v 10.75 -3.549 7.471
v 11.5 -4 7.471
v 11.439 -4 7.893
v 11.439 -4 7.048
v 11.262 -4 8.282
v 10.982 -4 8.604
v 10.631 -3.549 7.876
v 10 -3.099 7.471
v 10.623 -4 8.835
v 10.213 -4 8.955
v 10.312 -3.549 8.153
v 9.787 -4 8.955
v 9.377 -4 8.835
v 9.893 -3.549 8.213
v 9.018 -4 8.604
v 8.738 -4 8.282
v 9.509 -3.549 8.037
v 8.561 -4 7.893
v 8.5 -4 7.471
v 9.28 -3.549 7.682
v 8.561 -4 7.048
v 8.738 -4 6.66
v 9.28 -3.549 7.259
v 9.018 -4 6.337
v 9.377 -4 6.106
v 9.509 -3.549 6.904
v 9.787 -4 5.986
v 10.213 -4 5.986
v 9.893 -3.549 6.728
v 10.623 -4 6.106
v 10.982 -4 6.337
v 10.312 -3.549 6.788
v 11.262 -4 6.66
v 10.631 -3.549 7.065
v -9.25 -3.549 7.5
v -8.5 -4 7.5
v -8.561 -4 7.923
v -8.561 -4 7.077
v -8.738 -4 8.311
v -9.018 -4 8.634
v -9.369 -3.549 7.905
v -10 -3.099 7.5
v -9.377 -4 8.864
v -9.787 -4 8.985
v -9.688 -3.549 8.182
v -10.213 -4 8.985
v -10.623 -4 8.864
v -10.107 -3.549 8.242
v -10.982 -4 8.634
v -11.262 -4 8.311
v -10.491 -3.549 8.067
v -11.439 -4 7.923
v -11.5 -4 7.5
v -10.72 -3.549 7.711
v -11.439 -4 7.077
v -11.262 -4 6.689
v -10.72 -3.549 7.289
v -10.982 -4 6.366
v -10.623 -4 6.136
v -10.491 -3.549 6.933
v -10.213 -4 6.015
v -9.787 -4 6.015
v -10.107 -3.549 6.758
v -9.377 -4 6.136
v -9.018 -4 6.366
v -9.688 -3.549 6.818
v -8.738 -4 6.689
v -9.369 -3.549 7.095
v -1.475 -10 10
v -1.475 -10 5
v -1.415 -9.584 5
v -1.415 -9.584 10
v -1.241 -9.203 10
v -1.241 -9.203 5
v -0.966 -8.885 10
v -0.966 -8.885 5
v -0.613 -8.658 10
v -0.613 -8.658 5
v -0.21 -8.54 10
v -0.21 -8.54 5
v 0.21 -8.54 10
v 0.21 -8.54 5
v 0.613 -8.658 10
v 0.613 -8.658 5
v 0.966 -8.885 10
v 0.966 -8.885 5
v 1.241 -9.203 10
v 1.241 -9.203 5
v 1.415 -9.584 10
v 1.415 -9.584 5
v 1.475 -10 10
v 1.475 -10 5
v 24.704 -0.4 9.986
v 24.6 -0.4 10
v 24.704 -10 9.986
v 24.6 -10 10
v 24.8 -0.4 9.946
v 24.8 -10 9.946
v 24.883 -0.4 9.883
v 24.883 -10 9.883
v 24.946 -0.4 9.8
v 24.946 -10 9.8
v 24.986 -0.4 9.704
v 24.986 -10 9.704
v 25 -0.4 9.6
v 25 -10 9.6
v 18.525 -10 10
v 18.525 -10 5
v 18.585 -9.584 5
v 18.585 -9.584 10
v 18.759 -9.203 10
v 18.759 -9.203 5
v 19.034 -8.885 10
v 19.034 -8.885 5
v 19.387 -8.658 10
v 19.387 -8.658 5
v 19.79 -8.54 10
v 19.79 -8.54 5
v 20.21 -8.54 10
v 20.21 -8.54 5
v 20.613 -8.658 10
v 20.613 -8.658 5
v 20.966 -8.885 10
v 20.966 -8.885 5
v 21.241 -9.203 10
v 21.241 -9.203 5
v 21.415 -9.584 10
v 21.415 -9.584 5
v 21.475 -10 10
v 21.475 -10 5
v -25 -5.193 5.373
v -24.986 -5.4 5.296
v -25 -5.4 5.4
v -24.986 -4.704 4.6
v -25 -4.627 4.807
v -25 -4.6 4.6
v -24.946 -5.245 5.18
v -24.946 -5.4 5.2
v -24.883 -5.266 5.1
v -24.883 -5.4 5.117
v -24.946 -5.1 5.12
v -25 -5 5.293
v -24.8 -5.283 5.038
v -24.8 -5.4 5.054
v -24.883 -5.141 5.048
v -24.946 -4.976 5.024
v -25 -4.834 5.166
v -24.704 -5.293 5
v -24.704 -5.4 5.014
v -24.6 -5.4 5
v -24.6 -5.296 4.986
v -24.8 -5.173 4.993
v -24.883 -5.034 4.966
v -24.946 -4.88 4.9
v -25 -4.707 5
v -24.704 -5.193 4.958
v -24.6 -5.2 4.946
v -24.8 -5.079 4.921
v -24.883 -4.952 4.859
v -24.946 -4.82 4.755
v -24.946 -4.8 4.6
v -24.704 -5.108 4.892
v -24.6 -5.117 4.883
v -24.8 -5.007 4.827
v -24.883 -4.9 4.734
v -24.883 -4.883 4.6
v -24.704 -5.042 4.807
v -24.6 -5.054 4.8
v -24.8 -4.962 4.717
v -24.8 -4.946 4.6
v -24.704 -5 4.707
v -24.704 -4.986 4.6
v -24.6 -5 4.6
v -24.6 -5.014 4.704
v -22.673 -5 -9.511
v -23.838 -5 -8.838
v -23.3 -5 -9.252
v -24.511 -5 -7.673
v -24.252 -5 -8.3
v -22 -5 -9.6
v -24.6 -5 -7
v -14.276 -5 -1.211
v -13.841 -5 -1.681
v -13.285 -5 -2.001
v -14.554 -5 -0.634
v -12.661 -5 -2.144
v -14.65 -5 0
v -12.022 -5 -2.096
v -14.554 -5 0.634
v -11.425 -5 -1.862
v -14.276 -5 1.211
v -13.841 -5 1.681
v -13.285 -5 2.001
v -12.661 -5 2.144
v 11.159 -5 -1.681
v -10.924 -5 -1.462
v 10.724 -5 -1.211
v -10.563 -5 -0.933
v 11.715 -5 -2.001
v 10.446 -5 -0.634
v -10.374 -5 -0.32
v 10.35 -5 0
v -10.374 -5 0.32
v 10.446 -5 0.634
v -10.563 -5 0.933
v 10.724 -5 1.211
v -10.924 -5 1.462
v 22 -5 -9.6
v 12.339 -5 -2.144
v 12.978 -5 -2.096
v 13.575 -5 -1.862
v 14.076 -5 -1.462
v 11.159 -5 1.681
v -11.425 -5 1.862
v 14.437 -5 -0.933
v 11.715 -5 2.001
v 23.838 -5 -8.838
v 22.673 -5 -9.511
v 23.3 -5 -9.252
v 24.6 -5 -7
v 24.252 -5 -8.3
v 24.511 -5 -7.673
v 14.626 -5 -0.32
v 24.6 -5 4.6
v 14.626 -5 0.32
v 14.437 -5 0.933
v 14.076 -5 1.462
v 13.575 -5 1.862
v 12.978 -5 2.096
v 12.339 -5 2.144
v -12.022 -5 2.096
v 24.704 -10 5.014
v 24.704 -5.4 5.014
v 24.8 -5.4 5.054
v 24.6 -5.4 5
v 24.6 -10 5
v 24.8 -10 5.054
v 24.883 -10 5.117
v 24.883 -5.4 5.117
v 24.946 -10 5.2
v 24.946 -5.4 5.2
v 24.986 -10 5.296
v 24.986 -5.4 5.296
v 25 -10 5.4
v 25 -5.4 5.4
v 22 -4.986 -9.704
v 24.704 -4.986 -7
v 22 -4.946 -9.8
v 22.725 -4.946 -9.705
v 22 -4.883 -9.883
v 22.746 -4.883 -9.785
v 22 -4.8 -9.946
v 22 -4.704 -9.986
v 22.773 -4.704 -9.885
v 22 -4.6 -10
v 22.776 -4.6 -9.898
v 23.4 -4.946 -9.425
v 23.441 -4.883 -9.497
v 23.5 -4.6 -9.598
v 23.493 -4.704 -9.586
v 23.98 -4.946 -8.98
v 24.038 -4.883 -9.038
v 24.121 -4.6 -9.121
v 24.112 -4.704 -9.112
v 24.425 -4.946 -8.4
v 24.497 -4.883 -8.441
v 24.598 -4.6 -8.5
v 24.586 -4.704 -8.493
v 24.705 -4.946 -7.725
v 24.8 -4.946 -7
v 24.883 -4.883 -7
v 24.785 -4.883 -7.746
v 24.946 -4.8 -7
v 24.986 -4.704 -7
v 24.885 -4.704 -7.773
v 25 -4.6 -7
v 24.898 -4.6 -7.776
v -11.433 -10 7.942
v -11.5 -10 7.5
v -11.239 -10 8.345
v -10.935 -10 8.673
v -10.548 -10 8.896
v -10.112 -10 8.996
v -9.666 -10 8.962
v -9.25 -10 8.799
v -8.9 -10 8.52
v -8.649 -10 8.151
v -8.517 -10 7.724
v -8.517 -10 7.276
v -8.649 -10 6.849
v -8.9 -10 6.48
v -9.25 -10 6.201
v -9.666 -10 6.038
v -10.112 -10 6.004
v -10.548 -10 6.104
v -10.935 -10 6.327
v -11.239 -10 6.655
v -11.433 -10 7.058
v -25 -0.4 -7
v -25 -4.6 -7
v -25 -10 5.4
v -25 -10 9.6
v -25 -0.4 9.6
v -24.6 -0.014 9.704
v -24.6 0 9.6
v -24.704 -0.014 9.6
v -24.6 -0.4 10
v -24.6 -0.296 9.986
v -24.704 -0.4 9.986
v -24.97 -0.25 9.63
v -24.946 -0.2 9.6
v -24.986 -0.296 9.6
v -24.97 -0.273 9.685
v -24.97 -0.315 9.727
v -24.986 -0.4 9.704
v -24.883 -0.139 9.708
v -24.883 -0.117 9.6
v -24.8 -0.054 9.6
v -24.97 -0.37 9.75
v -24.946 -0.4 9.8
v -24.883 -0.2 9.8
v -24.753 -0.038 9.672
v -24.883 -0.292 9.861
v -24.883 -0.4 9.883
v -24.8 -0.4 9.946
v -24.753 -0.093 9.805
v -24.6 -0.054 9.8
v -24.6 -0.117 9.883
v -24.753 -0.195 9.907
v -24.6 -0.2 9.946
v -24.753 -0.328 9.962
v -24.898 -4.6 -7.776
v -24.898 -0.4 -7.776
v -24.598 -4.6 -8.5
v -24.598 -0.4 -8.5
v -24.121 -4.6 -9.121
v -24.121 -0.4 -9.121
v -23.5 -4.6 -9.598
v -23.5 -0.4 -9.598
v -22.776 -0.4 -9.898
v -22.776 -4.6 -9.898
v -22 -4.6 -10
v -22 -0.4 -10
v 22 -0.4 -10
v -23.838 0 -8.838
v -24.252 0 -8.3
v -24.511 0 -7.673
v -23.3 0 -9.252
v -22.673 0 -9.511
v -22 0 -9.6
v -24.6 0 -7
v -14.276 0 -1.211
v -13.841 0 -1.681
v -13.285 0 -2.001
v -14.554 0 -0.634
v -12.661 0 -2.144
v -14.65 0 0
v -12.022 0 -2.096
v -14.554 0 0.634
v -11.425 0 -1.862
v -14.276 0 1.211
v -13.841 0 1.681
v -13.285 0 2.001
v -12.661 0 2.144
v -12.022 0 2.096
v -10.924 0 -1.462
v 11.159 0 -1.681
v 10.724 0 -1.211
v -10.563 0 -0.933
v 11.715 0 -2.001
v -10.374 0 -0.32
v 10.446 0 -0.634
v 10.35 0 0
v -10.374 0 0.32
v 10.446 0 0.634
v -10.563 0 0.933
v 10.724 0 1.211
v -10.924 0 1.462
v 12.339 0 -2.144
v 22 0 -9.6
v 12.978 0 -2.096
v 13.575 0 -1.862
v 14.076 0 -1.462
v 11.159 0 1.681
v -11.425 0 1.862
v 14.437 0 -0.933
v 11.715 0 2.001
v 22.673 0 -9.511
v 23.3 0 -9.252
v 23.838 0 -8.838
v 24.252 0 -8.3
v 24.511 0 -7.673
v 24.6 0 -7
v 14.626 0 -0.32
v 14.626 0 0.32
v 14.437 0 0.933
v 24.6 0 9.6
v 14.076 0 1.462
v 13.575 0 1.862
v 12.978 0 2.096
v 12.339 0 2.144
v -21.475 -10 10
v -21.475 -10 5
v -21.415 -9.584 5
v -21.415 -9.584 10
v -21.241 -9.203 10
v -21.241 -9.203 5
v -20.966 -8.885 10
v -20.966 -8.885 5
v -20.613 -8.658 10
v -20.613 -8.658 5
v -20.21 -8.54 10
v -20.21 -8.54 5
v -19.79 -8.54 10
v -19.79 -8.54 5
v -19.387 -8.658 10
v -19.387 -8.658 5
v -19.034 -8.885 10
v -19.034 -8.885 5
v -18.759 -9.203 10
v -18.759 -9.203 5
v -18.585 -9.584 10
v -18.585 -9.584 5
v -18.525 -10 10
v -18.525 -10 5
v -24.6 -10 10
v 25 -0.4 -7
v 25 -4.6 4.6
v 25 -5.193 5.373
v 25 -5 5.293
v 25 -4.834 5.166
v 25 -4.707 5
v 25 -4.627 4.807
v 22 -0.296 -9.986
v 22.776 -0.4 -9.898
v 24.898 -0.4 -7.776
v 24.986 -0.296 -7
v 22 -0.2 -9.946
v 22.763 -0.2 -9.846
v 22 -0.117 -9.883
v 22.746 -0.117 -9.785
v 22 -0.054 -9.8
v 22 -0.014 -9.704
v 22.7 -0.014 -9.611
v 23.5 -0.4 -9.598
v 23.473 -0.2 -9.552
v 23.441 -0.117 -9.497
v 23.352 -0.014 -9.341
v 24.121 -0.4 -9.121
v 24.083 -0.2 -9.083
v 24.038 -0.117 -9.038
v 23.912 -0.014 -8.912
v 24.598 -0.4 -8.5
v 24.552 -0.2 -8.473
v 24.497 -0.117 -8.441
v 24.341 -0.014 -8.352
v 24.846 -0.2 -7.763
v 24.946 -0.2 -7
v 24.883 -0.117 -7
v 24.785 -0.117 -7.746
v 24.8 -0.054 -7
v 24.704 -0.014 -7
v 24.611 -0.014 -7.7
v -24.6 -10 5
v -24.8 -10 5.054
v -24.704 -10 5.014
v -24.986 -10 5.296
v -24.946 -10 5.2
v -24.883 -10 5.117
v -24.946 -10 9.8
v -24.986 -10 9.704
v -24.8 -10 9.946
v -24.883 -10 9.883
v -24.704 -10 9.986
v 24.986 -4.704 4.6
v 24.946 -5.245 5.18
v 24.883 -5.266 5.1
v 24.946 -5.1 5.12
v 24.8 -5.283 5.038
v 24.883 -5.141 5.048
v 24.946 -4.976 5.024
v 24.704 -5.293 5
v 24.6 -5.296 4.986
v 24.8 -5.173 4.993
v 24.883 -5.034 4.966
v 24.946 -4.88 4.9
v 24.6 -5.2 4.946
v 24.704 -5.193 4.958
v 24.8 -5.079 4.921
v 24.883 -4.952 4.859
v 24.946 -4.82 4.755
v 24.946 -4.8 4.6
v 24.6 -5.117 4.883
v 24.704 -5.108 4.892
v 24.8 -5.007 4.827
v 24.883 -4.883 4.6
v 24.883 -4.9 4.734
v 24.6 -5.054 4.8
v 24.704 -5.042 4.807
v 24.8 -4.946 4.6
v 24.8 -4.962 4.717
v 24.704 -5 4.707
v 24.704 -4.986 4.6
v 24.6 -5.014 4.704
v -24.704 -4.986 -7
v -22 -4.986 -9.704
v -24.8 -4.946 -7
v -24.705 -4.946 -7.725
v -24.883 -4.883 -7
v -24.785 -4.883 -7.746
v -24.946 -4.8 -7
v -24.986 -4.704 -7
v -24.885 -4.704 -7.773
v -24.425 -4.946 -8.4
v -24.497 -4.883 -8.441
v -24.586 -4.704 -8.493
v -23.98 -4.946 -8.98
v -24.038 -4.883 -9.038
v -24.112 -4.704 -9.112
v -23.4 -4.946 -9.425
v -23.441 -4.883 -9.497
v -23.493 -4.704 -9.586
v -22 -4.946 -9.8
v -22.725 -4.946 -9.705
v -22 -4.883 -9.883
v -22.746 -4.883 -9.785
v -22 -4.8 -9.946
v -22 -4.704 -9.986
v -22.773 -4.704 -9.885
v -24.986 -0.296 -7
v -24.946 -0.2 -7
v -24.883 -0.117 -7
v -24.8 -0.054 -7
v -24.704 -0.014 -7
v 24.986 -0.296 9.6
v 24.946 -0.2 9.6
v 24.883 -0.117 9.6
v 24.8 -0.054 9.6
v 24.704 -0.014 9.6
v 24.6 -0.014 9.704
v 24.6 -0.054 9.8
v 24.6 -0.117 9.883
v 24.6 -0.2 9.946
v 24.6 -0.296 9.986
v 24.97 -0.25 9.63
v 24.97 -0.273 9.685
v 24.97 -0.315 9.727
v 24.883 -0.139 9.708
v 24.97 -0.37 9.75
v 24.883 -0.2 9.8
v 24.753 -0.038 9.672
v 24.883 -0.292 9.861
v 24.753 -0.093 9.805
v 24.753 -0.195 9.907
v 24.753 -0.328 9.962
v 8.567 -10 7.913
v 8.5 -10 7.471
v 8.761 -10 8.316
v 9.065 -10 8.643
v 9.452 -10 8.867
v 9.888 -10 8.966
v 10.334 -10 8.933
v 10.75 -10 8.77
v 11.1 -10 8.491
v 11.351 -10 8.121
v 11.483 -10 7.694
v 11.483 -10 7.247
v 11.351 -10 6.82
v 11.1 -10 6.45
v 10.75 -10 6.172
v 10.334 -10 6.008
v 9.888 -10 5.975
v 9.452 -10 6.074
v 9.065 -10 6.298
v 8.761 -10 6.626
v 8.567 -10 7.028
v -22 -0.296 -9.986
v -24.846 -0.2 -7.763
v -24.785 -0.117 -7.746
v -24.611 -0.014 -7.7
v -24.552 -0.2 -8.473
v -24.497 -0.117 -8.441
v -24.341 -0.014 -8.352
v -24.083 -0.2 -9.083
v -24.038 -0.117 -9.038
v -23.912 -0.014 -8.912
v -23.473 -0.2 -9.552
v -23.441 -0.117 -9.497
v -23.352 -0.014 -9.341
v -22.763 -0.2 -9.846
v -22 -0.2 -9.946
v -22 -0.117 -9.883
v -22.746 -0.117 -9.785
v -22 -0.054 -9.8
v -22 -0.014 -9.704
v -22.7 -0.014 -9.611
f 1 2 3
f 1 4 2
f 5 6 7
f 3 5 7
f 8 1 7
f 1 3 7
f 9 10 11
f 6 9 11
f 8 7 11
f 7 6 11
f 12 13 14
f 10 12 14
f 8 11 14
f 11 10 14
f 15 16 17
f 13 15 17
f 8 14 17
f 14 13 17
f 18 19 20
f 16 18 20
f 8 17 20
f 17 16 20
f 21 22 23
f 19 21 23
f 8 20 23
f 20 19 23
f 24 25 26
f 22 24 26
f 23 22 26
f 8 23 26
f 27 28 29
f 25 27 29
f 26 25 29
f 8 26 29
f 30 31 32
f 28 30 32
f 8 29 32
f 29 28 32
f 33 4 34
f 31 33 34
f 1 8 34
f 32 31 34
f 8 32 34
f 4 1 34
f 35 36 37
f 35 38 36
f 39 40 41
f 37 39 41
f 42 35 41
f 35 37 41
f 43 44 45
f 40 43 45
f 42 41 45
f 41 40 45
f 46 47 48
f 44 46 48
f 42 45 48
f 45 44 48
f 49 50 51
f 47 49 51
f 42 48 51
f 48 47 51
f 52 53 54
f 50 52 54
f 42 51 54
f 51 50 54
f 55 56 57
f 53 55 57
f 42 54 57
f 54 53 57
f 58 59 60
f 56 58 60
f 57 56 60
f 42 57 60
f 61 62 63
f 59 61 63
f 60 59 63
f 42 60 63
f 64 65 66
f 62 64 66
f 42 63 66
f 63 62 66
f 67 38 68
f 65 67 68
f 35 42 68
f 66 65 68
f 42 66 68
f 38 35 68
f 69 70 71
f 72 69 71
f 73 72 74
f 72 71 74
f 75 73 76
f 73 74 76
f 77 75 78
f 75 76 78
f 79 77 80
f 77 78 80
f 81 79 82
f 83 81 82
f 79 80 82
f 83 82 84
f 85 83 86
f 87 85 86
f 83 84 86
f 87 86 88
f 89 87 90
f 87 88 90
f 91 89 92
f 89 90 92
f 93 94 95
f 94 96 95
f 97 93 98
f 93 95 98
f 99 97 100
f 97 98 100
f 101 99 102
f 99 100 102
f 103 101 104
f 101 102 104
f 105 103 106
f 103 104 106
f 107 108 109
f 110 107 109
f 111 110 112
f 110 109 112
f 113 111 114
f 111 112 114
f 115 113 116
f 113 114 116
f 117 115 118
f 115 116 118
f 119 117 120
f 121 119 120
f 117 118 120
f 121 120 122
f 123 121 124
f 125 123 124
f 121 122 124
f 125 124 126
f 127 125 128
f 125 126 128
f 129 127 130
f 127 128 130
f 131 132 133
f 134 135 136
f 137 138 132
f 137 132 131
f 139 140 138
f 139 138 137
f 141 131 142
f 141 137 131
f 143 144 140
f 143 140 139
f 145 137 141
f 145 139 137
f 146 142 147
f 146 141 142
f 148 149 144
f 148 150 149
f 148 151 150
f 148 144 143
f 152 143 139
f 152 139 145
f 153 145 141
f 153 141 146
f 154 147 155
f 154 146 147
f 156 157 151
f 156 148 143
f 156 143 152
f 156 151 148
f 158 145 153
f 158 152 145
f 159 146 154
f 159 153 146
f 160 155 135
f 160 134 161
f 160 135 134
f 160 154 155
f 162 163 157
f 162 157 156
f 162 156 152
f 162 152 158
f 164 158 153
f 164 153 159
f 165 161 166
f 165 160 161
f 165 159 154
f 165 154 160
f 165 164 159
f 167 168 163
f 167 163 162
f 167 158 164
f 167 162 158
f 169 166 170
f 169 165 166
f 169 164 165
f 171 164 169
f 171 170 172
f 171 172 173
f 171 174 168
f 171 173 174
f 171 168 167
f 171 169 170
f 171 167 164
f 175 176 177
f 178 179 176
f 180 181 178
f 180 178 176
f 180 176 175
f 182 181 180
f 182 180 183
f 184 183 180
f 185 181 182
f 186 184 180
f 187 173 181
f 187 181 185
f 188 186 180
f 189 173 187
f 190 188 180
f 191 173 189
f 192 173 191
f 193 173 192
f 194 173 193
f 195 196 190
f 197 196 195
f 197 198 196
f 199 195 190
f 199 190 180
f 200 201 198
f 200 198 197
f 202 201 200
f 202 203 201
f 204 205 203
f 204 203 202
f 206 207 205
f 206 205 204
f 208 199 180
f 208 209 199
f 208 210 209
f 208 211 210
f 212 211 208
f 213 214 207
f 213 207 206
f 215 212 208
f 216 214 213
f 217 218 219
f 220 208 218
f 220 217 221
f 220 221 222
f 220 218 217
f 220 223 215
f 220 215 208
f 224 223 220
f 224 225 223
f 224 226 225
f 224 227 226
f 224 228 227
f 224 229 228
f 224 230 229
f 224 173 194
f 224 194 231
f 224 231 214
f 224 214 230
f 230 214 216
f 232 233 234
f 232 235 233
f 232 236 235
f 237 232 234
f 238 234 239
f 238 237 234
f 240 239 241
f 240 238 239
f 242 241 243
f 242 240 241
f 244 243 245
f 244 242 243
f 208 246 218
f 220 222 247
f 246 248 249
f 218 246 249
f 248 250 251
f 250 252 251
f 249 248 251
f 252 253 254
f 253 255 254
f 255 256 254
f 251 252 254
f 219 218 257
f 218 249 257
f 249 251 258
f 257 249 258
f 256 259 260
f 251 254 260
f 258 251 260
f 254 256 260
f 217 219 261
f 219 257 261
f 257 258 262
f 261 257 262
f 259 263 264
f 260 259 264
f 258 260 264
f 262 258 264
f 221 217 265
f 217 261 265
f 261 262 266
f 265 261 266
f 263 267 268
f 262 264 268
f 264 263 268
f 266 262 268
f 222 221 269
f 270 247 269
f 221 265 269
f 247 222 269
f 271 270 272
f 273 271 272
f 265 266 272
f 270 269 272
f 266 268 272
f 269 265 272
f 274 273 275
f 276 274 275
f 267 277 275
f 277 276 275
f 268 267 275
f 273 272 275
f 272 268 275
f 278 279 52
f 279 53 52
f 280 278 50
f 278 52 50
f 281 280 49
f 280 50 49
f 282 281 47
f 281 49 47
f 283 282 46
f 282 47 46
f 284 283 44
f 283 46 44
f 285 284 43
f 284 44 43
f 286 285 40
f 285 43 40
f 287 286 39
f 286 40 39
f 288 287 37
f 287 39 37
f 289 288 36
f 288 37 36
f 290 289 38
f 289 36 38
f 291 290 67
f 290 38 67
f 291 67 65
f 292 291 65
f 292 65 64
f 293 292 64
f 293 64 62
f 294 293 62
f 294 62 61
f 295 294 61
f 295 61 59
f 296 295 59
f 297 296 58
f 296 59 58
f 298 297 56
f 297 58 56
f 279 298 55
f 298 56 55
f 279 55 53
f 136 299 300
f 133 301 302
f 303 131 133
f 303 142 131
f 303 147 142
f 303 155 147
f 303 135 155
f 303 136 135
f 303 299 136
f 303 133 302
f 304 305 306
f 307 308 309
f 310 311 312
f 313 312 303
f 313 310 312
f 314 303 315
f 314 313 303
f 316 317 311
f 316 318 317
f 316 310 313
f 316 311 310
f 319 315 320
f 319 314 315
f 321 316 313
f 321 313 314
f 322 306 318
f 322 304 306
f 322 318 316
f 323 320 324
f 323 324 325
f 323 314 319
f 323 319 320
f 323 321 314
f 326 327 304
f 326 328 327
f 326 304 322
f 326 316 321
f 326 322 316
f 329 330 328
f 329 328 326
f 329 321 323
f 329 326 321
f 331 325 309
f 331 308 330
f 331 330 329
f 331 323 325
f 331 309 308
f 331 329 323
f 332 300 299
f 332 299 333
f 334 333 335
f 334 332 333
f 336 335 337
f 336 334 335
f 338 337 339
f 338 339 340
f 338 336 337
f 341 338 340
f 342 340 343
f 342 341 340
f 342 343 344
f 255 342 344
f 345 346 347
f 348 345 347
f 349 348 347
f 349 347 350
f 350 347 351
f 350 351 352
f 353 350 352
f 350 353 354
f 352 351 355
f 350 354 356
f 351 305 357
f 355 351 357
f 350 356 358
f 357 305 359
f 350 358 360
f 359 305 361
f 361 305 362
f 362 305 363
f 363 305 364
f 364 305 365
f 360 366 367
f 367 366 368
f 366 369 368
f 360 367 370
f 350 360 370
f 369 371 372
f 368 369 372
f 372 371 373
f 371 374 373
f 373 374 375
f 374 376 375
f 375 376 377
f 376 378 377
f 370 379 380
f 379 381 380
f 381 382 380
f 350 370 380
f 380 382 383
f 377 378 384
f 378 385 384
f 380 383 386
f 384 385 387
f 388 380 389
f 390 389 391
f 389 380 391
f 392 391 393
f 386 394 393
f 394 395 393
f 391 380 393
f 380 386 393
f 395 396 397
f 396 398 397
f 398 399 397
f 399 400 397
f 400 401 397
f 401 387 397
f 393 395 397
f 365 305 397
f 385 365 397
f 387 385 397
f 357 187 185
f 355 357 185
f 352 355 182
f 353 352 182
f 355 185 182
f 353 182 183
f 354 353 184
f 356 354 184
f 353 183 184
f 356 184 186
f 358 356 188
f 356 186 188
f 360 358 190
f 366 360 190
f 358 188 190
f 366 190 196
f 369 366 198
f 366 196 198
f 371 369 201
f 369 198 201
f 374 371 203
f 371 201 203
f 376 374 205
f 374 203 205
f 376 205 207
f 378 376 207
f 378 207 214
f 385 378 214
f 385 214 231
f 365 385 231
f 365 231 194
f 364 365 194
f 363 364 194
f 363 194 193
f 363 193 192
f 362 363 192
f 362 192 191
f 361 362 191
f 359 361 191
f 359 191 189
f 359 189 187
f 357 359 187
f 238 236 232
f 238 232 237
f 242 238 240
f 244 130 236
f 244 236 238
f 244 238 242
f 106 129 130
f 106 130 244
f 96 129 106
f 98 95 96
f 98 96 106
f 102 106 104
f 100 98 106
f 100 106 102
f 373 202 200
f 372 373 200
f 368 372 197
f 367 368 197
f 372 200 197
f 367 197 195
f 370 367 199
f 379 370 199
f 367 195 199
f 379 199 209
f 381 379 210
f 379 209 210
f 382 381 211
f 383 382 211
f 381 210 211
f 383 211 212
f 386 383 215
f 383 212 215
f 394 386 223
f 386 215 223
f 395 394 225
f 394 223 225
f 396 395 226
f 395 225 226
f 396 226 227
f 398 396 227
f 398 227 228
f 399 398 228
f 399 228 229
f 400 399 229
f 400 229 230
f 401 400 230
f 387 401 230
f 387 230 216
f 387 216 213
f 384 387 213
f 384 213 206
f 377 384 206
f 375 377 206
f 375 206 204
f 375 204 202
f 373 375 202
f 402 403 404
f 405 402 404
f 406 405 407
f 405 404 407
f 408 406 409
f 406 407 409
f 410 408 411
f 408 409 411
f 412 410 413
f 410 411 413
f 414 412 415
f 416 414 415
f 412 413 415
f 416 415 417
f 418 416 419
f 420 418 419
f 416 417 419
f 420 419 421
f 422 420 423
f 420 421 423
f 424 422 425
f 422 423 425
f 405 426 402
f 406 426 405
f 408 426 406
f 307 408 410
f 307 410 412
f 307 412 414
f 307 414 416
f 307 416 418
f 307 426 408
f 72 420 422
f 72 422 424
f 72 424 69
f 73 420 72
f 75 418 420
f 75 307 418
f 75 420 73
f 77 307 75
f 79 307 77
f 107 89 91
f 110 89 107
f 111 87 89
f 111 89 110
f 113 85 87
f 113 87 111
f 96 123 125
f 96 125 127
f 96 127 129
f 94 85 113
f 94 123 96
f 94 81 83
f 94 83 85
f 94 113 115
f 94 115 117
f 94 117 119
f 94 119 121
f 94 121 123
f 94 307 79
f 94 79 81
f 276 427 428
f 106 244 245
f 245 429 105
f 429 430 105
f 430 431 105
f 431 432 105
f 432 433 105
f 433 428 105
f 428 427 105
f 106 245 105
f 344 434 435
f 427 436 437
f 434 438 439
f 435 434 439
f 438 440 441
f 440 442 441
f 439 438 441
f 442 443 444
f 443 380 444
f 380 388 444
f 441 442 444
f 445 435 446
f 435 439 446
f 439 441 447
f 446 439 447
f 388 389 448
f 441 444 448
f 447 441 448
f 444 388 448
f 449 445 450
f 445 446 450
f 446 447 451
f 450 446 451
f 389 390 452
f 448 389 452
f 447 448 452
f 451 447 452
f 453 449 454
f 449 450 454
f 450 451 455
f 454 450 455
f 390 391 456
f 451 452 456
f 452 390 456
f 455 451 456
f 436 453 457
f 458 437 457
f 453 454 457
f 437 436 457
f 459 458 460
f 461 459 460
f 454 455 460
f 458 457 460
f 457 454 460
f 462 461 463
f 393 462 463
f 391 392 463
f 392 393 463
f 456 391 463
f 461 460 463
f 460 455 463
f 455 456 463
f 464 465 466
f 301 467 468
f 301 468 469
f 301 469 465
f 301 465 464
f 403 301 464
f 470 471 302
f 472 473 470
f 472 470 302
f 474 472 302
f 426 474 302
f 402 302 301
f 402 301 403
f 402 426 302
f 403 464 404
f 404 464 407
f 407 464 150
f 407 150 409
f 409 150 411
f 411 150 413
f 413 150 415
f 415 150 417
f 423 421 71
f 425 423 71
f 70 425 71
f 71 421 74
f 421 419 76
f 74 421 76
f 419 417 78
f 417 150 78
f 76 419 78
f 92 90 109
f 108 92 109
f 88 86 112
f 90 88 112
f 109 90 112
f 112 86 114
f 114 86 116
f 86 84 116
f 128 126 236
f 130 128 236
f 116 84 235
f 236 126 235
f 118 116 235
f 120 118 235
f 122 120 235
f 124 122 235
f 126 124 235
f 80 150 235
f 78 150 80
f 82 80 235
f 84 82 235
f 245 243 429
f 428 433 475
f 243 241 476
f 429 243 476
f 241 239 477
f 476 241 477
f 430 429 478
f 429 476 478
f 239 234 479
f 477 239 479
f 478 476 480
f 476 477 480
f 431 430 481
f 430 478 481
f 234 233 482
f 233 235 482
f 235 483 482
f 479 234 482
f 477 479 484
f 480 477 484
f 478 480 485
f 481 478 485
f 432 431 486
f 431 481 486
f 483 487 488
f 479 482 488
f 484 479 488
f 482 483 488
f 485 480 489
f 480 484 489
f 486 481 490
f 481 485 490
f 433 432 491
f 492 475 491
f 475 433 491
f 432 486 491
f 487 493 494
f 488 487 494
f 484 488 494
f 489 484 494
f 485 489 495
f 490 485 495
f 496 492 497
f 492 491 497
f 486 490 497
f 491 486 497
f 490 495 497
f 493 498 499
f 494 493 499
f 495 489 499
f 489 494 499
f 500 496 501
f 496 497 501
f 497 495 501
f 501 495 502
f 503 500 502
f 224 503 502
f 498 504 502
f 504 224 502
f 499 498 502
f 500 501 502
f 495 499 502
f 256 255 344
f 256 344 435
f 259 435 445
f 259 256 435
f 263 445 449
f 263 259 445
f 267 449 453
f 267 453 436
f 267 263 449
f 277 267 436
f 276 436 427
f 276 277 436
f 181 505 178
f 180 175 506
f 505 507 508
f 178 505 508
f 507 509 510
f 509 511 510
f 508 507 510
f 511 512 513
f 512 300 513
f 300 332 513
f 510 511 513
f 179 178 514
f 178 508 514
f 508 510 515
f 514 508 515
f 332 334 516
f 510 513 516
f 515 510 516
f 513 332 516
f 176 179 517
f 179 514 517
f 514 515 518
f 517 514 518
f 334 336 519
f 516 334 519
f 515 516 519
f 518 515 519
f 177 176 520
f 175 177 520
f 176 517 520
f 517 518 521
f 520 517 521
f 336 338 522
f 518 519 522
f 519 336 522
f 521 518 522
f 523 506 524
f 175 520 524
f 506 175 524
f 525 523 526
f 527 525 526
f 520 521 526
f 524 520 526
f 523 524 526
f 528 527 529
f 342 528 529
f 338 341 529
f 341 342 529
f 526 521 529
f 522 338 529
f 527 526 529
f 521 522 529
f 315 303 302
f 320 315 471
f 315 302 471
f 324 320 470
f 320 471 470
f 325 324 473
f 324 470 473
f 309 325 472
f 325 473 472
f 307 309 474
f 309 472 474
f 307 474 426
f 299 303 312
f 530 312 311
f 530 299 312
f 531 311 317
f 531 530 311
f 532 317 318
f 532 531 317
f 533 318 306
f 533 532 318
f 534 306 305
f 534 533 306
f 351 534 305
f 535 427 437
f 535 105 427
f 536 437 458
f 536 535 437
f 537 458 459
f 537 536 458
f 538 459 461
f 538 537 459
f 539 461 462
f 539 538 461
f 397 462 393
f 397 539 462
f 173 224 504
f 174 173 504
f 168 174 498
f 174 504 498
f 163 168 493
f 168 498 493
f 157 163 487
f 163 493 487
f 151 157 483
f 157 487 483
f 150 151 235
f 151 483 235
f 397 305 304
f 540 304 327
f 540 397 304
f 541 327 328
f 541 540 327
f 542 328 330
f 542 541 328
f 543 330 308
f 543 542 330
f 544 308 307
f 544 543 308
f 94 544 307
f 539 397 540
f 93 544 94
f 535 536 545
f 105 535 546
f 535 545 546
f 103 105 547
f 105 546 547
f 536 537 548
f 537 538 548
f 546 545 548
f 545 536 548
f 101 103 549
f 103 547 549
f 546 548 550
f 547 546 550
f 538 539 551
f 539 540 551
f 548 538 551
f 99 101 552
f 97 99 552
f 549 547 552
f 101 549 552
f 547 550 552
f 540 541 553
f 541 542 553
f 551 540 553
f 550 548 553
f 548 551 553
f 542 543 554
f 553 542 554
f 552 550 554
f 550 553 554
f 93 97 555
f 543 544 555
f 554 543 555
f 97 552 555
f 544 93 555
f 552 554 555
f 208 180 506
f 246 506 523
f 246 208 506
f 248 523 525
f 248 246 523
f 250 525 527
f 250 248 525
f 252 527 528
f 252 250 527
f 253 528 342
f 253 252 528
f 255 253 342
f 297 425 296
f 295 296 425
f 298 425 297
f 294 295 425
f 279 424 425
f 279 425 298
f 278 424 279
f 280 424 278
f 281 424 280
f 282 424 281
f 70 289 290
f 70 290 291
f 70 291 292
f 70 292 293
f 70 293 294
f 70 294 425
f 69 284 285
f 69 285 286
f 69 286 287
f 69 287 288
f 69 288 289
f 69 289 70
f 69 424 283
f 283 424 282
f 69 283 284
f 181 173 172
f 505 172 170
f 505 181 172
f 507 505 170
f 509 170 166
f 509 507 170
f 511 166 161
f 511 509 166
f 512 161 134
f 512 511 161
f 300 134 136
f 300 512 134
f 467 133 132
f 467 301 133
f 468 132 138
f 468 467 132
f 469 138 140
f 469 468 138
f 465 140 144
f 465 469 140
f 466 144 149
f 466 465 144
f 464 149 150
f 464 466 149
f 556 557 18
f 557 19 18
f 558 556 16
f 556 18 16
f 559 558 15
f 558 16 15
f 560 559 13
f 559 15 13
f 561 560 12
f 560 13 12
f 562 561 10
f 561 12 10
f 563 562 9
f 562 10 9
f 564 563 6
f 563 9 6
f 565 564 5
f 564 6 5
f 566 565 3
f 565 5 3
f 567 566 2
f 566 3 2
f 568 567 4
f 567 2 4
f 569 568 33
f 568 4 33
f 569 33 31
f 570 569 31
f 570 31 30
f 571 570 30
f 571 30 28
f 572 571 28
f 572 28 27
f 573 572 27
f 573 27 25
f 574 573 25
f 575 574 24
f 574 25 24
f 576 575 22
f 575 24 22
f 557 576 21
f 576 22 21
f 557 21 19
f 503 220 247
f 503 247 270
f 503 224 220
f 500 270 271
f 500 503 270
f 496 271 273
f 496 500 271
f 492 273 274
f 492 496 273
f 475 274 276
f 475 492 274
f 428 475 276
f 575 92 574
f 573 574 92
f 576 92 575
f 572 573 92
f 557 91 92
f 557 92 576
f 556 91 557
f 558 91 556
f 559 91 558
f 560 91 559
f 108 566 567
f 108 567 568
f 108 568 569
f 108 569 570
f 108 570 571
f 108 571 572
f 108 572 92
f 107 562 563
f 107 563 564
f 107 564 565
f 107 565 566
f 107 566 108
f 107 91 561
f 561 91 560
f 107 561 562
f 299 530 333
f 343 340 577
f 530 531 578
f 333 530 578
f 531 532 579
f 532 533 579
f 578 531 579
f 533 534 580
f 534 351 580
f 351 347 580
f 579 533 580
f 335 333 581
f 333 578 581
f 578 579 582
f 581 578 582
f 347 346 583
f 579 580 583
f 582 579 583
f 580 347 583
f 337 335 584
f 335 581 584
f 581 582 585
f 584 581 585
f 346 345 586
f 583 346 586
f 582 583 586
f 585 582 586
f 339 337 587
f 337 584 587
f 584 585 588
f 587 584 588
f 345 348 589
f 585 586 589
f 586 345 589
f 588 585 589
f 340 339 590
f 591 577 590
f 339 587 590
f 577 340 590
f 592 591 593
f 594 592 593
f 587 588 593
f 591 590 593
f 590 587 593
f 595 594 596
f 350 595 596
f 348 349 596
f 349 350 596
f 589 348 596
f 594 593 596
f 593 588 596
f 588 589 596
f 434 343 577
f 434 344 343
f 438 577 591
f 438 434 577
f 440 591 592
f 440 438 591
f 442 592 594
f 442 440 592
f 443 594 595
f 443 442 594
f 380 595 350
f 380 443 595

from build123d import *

# Parameters (mm, degrees)
F0_W     = 50
F0_H     = 15
F1_DEPTH = 5
F2_D     = 4.3
F0_H_2   = 5
F3_DEPTH = 10
F5_D     = 2.95
F6_R     = 3
F7_R     = 0.4
F9_D     = 3
F9_DEPTH = 6
F9_TIP   = 0.9012909285


with BuildPart() as f1:
    # F0 (on Front) → F1 (new body)
    with BuildSketch(Plane.XZ):
        with Locations((0, -2.5)):
            Rectangle(F0_W, F0_H)
    extrude(amount=F1_DEPTH)

    # F2 (through all)
    with Locations(Plane(origin=(0, 0, 0), x_dir=(1, 0, 0), z_dir=(0, 1, 0))):
        with Locations((12.5, 0), (-12.5, 0)):
            Hole(F2_D / 2)

    # F0 (on Front) → F3 (join)
    with BuildSketch(Plane.XZ):
        with Locations((0, 7.5)):
            Rectangle(F0_W, F0_H_2)
    extrude(amount=F3_DEPTH)

    # F5 (through all)
    with Locations(Plane.XY.offset(10)):
        with Locations((-20, -10), (0, -10), (20, -10)):
            Hole(F5_D / 2)

    # F6
    f6_edges = [f1.edges().sort_by_distance(p)[0] for p in [
        (-25, -2.5, -10),
        (25, -2.5, -10),
    ]]
    fillet(f6_edges, radius=F6_R)

    # F7
    f7_edges = [f1.edges().sort_by_distance(p)[0] for p in [
        (0, 0, 10),
        (-25, 0, 1.5),
        (-25, -5, 10),
        (25, -5, 10),
        (0, -5, -10),
        (0, -5, 5),
        (25, -5, -1),
        (25, -7.5, 5),
        (25, 0, 1.5),
        (24.12132, -5, -9.12132),
        (-25, -5, -1),
        (-24.12132, -5, -9.12132),
        (24.12132, 0, -9.12132),
        (-25, -7.5, 5),
        (0, 0, -10),
        (-24.12132, 0, -9.12132),
    ]]
    fillet(f7_edges, radius=F7_R)

    # F9
    with Locations(Plane.XZ.offset(10)):
        with Locations((-10, 7.5), (10, 7.4705528095)):
            Hole(F9_D / 2, depth=F9_DEPTH)
            with Locations((0, 0, -(F9_DEPTH + F9_TIP / 2))):  # 118° drill point
                Cone(0, F9_D / 2, F9_TIP, mode=Mode.SUBTRACT)


solid = f1.part
